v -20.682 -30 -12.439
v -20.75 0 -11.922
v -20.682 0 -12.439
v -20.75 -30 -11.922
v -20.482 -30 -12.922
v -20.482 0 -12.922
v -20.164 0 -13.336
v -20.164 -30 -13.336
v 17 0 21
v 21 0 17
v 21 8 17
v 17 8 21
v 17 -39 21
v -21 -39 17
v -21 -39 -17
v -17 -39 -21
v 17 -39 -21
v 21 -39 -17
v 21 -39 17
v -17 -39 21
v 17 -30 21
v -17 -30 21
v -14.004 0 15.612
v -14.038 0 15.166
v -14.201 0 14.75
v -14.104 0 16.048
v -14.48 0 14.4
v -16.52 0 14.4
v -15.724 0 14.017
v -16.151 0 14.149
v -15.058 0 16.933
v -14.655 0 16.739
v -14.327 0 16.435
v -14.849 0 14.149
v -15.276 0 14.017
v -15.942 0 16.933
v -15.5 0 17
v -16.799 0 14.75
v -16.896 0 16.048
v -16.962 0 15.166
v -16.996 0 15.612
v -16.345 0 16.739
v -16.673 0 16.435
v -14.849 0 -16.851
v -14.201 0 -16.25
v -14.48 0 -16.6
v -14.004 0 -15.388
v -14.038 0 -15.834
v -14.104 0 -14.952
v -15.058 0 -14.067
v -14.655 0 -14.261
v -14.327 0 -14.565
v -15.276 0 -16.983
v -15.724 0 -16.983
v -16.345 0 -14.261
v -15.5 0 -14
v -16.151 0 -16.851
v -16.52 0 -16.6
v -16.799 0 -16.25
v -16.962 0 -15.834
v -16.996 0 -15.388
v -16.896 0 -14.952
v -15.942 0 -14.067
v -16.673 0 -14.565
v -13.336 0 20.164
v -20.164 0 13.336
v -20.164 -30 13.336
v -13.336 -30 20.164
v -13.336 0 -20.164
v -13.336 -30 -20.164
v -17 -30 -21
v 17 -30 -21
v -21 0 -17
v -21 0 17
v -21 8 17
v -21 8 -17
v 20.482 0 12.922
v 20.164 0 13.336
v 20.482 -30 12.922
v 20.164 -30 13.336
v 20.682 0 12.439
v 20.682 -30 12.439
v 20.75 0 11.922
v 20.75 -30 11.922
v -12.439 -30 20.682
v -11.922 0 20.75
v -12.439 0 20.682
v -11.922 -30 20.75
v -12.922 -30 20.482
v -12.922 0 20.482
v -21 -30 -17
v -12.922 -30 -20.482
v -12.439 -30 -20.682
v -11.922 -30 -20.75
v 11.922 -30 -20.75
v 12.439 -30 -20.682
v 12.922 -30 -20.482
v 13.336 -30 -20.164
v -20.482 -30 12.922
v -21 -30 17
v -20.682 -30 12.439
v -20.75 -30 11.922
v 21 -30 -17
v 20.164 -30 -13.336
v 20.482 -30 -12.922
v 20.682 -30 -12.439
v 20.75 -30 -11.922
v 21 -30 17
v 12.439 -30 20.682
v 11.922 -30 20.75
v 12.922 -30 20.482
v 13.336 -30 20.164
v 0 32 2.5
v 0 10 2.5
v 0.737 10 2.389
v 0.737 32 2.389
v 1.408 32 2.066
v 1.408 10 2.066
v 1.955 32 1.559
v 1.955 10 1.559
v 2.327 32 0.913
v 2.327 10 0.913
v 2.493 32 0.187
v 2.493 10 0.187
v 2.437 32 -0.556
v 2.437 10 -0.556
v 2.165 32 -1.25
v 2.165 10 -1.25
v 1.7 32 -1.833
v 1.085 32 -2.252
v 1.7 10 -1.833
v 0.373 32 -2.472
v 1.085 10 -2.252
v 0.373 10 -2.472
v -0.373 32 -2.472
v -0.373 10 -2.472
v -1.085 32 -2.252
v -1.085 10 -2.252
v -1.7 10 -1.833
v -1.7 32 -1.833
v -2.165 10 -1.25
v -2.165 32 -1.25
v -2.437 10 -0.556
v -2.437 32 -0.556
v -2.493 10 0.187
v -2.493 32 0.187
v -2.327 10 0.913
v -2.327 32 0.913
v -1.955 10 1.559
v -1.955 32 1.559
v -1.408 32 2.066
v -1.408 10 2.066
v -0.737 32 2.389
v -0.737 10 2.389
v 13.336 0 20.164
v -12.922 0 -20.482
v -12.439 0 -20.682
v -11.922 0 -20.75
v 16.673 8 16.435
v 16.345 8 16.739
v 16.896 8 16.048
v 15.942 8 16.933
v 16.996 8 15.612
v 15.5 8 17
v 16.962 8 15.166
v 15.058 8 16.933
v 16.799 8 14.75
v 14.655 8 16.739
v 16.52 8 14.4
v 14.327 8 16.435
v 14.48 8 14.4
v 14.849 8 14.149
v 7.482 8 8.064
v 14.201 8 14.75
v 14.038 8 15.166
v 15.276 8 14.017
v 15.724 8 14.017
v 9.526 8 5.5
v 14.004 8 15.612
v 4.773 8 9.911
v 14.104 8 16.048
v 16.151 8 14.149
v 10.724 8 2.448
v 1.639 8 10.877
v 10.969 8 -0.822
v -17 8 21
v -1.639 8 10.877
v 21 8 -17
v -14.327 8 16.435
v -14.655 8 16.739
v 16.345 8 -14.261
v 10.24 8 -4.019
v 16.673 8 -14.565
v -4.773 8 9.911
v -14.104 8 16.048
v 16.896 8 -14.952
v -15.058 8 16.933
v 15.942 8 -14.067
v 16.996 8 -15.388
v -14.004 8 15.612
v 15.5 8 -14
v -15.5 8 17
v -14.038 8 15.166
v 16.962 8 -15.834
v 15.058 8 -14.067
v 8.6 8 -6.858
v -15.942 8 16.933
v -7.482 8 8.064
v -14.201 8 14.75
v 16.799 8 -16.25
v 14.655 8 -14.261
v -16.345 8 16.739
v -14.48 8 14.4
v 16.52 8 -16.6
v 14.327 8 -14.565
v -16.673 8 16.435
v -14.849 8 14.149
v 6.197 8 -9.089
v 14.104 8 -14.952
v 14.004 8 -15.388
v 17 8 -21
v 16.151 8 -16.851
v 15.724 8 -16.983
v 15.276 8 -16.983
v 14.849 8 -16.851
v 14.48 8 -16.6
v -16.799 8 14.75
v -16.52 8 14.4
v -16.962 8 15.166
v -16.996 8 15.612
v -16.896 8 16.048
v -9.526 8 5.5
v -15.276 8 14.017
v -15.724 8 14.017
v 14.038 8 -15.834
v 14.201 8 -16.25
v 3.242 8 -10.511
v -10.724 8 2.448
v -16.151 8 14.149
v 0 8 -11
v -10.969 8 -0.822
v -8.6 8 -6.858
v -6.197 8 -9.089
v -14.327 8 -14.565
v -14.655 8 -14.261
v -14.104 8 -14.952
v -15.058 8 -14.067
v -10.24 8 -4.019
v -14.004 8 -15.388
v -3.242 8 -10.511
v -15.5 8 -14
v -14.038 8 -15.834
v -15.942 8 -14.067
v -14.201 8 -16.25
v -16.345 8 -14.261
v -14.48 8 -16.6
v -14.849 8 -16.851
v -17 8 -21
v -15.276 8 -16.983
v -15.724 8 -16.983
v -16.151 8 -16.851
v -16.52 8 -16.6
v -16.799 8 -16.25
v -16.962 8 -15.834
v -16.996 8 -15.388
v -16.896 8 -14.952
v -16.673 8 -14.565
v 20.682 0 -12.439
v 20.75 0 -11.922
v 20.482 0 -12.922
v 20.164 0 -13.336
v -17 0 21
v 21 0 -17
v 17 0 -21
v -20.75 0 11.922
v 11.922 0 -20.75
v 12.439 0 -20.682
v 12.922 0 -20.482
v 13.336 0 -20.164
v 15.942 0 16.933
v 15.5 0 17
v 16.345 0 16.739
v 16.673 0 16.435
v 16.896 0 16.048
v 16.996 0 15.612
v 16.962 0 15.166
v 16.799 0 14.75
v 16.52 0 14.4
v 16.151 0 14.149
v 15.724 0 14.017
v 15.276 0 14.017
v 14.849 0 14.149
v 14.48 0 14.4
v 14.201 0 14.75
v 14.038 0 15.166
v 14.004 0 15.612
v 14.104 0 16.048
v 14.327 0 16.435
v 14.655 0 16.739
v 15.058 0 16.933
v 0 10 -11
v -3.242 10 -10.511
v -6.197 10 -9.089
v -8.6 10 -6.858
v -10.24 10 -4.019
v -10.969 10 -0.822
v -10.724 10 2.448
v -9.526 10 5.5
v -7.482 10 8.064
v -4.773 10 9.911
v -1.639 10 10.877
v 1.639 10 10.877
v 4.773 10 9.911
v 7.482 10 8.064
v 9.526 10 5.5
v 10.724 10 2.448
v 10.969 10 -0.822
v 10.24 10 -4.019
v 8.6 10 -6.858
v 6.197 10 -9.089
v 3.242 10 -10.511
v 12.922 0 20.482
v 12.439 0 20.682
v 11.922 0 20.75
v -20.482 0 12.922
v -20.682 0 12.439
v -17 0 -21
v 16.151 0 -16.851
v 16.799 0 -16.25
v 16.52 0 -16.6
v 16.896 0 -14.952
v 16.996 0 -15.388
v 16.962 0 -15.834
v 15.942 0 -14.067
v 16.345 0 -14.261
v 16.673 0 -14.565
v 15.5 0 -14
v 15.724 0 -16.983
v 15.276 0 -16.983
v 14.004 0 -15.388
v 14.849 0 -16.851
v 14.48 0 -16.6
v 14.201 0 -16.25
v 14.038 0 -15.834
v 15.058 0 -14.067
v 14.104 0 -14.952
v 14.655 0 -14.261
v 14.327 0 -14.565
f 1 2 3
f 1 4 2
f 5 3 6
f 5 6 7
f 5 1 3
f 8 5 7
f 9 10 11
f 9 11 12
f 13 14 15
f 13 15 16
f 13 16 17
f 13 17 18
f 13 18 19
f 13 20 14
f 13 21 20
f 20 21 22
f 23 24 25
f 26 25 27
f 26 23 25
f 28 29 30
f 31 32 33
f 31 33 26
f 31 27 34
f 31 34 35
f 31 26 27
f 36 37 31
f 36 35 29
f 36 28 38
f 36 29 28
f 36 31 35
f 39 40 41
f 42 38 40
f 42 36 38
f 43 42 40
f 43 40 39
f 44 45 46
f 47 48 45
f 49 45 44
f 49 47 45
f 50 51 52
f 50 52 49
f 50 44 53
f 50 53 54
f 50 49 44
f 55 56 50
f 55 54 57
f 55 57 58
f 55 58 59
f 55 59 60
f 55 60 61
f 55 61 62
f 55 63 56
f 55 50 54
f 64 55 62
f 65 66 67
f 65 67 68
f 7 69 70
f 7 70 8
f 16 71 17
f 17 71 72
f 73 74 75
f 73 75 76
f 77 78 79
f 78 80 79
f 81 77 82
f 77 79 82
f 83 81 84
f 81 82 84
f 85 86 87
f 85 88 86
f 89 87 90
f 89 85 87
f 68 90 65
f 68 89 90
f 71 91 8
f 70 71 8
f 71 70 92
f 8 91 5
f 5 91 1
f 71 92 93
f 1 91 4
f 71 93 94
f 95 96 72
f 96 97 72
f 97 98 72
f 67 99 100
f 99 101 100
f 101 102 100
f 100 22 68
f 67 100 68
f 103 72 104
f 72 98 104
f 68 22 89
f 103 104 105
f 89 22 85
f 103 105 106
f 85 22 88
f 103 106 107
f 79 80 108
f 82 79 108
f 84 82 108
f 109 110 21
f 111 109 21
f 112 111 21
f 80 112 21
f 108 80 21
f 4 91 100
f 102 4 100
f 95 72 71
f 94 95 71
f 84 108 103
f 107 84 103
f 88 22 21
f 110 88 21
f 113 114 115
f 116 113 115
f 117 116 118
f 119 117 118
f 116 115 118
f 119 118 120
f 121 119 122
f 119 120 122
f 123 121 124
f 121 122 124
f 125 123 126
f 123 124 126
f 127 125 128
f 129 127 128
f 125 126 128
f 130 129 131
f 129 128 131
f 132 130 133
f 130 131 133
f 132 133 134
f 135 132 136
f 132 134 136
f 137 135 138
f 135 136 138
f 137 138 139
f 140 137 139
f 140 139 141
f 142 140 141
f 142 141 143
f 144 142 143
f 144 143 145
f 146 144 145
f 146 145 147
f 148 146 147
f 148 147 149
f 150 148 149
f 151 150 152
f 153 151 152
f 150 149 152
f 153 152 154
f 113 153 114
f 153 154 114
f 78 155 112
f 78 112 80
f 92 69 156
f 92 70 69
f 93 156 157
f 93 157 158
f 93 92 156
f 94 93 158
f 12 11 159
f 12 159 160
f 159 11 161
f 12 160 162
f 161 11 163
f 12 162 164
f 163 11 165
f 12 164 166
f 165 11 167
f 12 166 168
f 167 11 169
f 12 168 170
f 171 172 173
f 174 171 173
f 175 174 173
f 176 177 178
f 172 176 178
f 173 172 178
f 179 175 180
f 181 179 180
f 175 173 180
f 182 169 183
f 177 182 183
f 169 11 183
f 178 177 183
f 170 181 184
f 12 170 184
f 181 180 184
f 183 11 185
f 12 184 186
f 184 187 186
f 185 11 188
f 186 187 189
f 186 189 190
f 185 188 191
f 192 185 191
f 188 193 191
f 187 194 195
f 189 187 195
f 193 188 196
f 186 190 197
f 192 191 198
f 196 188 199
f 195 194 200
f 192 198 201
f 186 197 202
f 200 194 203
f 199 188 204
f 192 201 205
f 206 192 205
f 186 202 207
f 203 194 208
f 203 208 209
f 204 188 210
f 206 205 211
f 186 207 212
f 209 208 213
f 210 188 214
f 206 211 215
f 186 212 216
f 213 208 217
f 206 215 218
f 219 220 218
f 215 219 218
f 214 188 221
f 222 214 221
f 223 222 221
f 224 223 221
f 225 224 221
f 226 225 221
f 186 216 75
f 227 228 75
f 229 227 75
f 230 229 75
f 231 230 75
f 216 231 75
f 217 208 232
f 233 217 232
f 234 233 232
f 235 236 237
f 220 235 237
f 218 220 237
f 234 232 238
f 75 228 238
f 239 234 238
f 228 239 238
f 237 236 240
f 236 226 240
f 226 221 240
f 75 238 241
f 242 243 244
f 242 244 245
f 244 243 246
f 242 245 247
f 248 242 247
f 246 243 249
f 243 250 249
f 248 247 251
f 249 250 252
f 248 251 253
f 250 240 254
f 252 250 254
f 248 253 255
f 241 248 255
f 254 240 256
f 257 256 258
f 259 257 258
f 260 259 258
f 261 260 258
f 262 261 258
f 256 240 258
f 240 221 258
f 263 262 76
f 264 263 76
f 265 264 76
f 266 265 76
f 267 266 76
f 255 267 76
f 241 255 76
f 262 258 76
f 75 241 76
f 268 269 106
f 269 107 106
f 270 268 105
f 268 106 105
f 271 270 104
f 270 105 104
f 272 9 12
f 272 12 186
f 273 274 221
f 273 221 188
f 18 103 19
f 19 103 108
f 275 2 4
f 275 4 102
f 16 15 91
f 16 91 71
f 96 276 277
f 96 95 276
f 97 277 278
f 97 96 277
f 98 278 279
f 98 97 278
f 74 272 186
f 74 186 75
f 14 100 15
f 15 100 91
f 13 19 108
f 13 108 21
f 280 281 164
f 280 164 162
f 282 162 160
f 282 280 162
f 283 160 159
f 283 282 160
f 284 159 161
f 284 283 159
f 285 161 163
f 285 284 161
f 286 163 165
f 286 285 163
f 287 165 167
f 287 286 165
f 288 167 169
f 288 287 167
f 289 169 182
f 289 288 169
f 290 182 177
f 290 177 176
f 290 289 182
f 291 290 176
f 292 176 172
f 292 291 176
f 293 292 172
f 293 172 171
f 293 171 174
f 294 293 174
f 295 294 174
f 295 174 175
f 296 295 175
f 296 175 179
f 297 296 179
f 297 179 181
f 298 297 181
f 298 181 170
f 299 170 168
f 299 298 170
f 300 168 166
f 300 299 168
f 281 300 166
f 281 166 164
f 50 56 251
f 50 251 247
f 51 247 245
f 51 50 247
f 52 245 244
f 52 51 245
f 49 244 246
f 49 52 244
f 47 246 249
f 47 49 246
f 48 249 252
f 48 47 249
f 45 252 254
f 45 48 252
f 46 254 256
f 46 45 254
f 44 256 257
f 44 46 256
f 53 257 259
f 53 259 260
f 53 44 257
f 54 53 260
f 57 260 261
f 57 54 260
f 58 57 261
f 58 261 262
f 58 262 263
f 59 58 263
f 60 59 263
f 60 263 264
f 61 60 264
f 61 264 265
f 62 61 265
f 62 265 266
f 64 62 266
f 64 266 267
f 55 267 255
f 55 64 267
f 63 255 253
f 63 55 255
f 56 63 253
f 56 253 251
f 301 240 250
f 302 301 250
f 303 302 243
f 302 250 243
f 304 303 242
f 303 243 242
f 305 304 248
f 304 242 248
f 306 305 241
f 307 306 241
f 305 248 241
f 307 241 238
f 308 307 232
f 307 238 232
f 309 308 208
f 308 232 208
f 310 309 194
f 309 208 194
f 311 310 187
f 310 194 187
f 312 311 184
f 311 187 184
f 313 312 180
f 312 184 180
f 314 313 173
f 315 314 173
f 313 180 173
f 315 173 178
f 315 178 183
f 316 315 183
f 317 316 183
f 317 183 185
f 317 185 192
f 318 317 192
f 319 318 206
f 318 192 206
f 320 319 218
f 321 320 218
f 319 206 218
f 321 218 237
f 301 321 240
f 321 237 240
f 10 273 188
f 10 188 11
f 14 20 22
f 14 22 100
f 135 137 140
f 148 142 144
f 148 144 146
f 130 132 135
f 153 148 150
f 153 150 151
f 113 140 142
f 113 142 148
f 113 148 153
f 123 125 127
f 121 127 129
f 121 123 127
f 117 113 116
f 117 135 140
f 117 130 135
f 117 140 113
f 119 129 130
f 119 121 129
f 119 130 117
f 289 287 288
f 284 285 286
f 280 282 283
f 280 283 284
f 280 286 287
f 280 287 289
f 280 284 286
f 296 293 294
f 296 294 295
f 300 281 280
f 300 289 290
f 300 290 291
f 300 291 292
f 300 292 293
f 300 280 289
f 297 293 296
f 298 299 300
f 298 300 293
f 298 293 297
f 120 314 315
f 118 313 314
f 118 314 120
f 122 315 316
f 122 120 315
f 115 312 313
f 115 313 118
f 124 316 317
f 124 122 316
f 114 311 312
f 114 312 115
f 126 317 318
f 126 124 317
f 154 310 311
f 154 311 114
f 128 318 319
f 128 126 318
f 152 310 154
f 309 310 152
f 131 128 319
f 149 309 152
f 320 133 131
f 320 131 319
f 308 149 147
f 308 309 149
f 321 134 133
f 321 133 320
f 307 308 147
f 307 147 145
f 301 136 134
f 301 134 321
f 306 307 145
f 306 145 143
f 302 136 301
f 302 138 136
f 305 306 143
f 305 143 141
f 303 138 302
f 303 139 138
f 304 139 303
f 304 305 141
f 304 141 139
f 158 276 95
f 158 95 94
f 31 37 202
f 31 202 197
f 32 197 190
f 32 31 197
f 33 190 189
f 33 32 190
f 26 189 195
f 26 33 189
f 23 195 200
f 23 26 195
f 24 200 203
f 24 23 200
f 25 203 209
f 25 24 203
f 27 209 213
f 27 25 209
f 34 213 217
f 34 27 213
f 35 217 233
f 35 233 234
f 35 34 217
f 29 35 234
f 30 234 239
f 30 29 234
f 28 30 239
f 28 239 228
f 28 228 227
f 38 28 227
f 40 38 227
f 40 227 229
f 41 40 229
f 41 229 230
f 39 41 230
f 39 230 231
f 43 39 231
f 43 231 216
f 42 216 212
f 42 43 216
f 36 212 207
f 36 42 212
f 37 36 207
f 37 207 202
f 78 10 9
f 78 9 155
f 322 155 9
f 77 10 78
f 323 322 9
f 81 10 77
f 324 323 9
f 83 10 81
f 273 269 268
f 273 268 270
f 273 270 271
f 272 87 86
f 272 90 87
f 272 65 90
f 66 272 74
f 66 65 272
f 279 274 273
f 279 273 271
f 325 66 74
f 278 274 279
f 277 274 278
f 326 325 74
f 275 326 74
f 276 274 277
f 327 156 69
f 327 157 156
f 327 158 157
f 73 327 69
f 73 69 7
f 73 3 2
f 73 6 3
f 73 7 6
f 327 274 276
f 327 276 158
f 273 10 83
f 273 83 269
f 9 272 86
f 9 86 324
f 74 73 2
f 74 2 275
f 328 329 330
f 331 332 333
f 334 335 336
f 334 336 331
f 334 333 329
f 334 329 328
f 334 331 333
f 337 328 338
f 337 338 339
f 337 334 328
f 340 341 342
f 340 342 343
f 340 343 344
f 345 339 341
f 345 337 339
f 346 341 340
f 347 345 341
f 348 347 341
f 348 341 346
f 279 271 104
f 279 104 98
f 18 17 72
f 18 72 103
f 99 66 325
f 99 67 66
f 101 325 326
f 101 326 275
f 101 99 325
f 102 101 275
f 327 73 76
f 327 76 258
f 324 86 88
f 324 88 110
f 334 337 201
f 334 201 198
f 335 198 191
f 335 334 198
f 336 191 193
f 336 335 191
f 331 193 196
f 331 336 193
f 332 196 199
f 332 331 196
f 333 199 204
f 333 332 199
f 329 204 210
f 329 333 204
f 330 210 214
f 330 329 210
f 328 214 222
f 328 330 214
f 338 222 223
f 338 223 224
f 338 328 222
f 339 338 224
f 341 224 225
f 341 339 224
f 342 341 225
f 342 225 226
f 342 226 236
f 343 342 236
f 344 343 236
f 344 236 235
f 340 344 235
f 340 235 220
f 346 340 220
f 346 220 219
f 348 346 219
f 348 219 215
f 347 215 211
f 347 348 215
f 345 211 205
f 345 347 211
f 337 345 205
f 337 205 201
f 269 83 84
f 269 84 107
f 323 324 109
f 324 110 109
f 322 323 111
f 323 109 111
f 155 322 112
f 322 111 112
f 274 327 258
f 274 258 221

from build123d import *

# Parameters (mm, degrees)
SKETCH1_R           = 1.5
BOSS_EXTRUDE1_DEPTH = 8
BOSS_EXTRUDE2_DEPTH = 30
FILLET1_R           = 2
BOSS_EXTRUDE3_DEPTH = 9
SKETCH4_R           = 11
BOSS_EXTRUDE4_DEPTH = 2
SKETCH5_R           = 2.5
BOSS_EXTRUDE5_DEPTH = 22


with BuildPart() as part:
    # Sketch1 → Boss-Extrude1 (new body)
    with BuildSketch(Plane(origin=(0, 0, 0), x_dir=(1, 0, 0), z_dir=(0, 1, 0))):
        Polygon((-17, 21), (17, 21), (21, 17), (21, -17), (17, -21), (-17, -21), (-21, -17), (-21, 17), align=None)
        with Locations(Location((-15.5, 15.5, 0), (0, 0, 270))):
            Circle(SKETCH1_R, mode=Mode.SUBTRACT)
        with Locations(Location((-15.5, -15.5, 0), (0, 0, 270))):
            Circle(SKETCH1_R, mode=Mode.SUBTRACT)
        with Locations(Location((15.5, -15.5, 0), (0, 0, 270))):
            Circle(SKETCH1_R, mode=Mode.SUBTRACT)
        with Locations(Location((15.5, 15.5, 0), (0, 0, 270))):
            Circle(SKETCH1_R, mode=Mode.SUBTRACT)
    extrude(amount=BOSS_EXTRUDE1_DEPTH)

    # Sketch2 → Boss-Extrude2 (add)
    with BuildSketch(Plane.XZ):
        Polygon((-12.75, 20.75), (12.75, 20.75), (20.75, 12.75), (20.75, -12.75), (12.75, -20.75), (-12.75, -20.75), (-20.75, -12.75), (-20.75, 12.75), align=None)
    extrude(amount=BOSS_EXTRUDE2_DEPTH)

    # Fillet1
    fillet1_edges = [part.edges().sort_by_distance(p)[0] for p in [
        (20.75, -15, 12.75),
        (12.75, -15, 20.75),
        (-12.75, -15, 20.75),
        (-20.75, -15, 12.75),
        (-20.75, -15, -12.75),
        (-12.75, -15, -20.75),
        (12.75, -15, -20.75),
        (20.75, -15, -12.75),
    ]]
    fillet(fillet1_edges, radius=FILLET1_R)

    # Sketch3 → Boss-Extrude3 (add)
    with BuildSketch(Plane.XZ.offset(30)):
        Polygon((-21, 17), (-21, -17), (-17, -21), (17, -21), (21, -17), (21, 17), (17, 21), (-17, 21), align=None)
    extrude(amount=BOSS_EXTRUDE3_DEPTH)

    # Sketch4 → Boss-Extrude4 (add)
    with BuildSketch(Plane(origin=(0, 8, 0), x_dir=(1, 0, 0), z_dir=(0, 1, 0))):
        with Locations(Location((0, 0, 0), (0, 0, 90))):
            Circle(SKETCH4_R)
    extrude(amount=BOSS_EXTRUDE4_DEPTH)

    # Sketch5 → Boss-Extrude5 (add)
    with BuildSketch(Plane(origin=(0, 10, 0), x_dir=(1, 0, 0), z_dir=(0, 1, 0))):
        with Locations(Location((0, 0, 0), (0, 0, 270))):
            Circle(SKETCH5_R)
    extrude(amount=BOSS_EXTRUDE5_DEPTH)


solid = part.part
